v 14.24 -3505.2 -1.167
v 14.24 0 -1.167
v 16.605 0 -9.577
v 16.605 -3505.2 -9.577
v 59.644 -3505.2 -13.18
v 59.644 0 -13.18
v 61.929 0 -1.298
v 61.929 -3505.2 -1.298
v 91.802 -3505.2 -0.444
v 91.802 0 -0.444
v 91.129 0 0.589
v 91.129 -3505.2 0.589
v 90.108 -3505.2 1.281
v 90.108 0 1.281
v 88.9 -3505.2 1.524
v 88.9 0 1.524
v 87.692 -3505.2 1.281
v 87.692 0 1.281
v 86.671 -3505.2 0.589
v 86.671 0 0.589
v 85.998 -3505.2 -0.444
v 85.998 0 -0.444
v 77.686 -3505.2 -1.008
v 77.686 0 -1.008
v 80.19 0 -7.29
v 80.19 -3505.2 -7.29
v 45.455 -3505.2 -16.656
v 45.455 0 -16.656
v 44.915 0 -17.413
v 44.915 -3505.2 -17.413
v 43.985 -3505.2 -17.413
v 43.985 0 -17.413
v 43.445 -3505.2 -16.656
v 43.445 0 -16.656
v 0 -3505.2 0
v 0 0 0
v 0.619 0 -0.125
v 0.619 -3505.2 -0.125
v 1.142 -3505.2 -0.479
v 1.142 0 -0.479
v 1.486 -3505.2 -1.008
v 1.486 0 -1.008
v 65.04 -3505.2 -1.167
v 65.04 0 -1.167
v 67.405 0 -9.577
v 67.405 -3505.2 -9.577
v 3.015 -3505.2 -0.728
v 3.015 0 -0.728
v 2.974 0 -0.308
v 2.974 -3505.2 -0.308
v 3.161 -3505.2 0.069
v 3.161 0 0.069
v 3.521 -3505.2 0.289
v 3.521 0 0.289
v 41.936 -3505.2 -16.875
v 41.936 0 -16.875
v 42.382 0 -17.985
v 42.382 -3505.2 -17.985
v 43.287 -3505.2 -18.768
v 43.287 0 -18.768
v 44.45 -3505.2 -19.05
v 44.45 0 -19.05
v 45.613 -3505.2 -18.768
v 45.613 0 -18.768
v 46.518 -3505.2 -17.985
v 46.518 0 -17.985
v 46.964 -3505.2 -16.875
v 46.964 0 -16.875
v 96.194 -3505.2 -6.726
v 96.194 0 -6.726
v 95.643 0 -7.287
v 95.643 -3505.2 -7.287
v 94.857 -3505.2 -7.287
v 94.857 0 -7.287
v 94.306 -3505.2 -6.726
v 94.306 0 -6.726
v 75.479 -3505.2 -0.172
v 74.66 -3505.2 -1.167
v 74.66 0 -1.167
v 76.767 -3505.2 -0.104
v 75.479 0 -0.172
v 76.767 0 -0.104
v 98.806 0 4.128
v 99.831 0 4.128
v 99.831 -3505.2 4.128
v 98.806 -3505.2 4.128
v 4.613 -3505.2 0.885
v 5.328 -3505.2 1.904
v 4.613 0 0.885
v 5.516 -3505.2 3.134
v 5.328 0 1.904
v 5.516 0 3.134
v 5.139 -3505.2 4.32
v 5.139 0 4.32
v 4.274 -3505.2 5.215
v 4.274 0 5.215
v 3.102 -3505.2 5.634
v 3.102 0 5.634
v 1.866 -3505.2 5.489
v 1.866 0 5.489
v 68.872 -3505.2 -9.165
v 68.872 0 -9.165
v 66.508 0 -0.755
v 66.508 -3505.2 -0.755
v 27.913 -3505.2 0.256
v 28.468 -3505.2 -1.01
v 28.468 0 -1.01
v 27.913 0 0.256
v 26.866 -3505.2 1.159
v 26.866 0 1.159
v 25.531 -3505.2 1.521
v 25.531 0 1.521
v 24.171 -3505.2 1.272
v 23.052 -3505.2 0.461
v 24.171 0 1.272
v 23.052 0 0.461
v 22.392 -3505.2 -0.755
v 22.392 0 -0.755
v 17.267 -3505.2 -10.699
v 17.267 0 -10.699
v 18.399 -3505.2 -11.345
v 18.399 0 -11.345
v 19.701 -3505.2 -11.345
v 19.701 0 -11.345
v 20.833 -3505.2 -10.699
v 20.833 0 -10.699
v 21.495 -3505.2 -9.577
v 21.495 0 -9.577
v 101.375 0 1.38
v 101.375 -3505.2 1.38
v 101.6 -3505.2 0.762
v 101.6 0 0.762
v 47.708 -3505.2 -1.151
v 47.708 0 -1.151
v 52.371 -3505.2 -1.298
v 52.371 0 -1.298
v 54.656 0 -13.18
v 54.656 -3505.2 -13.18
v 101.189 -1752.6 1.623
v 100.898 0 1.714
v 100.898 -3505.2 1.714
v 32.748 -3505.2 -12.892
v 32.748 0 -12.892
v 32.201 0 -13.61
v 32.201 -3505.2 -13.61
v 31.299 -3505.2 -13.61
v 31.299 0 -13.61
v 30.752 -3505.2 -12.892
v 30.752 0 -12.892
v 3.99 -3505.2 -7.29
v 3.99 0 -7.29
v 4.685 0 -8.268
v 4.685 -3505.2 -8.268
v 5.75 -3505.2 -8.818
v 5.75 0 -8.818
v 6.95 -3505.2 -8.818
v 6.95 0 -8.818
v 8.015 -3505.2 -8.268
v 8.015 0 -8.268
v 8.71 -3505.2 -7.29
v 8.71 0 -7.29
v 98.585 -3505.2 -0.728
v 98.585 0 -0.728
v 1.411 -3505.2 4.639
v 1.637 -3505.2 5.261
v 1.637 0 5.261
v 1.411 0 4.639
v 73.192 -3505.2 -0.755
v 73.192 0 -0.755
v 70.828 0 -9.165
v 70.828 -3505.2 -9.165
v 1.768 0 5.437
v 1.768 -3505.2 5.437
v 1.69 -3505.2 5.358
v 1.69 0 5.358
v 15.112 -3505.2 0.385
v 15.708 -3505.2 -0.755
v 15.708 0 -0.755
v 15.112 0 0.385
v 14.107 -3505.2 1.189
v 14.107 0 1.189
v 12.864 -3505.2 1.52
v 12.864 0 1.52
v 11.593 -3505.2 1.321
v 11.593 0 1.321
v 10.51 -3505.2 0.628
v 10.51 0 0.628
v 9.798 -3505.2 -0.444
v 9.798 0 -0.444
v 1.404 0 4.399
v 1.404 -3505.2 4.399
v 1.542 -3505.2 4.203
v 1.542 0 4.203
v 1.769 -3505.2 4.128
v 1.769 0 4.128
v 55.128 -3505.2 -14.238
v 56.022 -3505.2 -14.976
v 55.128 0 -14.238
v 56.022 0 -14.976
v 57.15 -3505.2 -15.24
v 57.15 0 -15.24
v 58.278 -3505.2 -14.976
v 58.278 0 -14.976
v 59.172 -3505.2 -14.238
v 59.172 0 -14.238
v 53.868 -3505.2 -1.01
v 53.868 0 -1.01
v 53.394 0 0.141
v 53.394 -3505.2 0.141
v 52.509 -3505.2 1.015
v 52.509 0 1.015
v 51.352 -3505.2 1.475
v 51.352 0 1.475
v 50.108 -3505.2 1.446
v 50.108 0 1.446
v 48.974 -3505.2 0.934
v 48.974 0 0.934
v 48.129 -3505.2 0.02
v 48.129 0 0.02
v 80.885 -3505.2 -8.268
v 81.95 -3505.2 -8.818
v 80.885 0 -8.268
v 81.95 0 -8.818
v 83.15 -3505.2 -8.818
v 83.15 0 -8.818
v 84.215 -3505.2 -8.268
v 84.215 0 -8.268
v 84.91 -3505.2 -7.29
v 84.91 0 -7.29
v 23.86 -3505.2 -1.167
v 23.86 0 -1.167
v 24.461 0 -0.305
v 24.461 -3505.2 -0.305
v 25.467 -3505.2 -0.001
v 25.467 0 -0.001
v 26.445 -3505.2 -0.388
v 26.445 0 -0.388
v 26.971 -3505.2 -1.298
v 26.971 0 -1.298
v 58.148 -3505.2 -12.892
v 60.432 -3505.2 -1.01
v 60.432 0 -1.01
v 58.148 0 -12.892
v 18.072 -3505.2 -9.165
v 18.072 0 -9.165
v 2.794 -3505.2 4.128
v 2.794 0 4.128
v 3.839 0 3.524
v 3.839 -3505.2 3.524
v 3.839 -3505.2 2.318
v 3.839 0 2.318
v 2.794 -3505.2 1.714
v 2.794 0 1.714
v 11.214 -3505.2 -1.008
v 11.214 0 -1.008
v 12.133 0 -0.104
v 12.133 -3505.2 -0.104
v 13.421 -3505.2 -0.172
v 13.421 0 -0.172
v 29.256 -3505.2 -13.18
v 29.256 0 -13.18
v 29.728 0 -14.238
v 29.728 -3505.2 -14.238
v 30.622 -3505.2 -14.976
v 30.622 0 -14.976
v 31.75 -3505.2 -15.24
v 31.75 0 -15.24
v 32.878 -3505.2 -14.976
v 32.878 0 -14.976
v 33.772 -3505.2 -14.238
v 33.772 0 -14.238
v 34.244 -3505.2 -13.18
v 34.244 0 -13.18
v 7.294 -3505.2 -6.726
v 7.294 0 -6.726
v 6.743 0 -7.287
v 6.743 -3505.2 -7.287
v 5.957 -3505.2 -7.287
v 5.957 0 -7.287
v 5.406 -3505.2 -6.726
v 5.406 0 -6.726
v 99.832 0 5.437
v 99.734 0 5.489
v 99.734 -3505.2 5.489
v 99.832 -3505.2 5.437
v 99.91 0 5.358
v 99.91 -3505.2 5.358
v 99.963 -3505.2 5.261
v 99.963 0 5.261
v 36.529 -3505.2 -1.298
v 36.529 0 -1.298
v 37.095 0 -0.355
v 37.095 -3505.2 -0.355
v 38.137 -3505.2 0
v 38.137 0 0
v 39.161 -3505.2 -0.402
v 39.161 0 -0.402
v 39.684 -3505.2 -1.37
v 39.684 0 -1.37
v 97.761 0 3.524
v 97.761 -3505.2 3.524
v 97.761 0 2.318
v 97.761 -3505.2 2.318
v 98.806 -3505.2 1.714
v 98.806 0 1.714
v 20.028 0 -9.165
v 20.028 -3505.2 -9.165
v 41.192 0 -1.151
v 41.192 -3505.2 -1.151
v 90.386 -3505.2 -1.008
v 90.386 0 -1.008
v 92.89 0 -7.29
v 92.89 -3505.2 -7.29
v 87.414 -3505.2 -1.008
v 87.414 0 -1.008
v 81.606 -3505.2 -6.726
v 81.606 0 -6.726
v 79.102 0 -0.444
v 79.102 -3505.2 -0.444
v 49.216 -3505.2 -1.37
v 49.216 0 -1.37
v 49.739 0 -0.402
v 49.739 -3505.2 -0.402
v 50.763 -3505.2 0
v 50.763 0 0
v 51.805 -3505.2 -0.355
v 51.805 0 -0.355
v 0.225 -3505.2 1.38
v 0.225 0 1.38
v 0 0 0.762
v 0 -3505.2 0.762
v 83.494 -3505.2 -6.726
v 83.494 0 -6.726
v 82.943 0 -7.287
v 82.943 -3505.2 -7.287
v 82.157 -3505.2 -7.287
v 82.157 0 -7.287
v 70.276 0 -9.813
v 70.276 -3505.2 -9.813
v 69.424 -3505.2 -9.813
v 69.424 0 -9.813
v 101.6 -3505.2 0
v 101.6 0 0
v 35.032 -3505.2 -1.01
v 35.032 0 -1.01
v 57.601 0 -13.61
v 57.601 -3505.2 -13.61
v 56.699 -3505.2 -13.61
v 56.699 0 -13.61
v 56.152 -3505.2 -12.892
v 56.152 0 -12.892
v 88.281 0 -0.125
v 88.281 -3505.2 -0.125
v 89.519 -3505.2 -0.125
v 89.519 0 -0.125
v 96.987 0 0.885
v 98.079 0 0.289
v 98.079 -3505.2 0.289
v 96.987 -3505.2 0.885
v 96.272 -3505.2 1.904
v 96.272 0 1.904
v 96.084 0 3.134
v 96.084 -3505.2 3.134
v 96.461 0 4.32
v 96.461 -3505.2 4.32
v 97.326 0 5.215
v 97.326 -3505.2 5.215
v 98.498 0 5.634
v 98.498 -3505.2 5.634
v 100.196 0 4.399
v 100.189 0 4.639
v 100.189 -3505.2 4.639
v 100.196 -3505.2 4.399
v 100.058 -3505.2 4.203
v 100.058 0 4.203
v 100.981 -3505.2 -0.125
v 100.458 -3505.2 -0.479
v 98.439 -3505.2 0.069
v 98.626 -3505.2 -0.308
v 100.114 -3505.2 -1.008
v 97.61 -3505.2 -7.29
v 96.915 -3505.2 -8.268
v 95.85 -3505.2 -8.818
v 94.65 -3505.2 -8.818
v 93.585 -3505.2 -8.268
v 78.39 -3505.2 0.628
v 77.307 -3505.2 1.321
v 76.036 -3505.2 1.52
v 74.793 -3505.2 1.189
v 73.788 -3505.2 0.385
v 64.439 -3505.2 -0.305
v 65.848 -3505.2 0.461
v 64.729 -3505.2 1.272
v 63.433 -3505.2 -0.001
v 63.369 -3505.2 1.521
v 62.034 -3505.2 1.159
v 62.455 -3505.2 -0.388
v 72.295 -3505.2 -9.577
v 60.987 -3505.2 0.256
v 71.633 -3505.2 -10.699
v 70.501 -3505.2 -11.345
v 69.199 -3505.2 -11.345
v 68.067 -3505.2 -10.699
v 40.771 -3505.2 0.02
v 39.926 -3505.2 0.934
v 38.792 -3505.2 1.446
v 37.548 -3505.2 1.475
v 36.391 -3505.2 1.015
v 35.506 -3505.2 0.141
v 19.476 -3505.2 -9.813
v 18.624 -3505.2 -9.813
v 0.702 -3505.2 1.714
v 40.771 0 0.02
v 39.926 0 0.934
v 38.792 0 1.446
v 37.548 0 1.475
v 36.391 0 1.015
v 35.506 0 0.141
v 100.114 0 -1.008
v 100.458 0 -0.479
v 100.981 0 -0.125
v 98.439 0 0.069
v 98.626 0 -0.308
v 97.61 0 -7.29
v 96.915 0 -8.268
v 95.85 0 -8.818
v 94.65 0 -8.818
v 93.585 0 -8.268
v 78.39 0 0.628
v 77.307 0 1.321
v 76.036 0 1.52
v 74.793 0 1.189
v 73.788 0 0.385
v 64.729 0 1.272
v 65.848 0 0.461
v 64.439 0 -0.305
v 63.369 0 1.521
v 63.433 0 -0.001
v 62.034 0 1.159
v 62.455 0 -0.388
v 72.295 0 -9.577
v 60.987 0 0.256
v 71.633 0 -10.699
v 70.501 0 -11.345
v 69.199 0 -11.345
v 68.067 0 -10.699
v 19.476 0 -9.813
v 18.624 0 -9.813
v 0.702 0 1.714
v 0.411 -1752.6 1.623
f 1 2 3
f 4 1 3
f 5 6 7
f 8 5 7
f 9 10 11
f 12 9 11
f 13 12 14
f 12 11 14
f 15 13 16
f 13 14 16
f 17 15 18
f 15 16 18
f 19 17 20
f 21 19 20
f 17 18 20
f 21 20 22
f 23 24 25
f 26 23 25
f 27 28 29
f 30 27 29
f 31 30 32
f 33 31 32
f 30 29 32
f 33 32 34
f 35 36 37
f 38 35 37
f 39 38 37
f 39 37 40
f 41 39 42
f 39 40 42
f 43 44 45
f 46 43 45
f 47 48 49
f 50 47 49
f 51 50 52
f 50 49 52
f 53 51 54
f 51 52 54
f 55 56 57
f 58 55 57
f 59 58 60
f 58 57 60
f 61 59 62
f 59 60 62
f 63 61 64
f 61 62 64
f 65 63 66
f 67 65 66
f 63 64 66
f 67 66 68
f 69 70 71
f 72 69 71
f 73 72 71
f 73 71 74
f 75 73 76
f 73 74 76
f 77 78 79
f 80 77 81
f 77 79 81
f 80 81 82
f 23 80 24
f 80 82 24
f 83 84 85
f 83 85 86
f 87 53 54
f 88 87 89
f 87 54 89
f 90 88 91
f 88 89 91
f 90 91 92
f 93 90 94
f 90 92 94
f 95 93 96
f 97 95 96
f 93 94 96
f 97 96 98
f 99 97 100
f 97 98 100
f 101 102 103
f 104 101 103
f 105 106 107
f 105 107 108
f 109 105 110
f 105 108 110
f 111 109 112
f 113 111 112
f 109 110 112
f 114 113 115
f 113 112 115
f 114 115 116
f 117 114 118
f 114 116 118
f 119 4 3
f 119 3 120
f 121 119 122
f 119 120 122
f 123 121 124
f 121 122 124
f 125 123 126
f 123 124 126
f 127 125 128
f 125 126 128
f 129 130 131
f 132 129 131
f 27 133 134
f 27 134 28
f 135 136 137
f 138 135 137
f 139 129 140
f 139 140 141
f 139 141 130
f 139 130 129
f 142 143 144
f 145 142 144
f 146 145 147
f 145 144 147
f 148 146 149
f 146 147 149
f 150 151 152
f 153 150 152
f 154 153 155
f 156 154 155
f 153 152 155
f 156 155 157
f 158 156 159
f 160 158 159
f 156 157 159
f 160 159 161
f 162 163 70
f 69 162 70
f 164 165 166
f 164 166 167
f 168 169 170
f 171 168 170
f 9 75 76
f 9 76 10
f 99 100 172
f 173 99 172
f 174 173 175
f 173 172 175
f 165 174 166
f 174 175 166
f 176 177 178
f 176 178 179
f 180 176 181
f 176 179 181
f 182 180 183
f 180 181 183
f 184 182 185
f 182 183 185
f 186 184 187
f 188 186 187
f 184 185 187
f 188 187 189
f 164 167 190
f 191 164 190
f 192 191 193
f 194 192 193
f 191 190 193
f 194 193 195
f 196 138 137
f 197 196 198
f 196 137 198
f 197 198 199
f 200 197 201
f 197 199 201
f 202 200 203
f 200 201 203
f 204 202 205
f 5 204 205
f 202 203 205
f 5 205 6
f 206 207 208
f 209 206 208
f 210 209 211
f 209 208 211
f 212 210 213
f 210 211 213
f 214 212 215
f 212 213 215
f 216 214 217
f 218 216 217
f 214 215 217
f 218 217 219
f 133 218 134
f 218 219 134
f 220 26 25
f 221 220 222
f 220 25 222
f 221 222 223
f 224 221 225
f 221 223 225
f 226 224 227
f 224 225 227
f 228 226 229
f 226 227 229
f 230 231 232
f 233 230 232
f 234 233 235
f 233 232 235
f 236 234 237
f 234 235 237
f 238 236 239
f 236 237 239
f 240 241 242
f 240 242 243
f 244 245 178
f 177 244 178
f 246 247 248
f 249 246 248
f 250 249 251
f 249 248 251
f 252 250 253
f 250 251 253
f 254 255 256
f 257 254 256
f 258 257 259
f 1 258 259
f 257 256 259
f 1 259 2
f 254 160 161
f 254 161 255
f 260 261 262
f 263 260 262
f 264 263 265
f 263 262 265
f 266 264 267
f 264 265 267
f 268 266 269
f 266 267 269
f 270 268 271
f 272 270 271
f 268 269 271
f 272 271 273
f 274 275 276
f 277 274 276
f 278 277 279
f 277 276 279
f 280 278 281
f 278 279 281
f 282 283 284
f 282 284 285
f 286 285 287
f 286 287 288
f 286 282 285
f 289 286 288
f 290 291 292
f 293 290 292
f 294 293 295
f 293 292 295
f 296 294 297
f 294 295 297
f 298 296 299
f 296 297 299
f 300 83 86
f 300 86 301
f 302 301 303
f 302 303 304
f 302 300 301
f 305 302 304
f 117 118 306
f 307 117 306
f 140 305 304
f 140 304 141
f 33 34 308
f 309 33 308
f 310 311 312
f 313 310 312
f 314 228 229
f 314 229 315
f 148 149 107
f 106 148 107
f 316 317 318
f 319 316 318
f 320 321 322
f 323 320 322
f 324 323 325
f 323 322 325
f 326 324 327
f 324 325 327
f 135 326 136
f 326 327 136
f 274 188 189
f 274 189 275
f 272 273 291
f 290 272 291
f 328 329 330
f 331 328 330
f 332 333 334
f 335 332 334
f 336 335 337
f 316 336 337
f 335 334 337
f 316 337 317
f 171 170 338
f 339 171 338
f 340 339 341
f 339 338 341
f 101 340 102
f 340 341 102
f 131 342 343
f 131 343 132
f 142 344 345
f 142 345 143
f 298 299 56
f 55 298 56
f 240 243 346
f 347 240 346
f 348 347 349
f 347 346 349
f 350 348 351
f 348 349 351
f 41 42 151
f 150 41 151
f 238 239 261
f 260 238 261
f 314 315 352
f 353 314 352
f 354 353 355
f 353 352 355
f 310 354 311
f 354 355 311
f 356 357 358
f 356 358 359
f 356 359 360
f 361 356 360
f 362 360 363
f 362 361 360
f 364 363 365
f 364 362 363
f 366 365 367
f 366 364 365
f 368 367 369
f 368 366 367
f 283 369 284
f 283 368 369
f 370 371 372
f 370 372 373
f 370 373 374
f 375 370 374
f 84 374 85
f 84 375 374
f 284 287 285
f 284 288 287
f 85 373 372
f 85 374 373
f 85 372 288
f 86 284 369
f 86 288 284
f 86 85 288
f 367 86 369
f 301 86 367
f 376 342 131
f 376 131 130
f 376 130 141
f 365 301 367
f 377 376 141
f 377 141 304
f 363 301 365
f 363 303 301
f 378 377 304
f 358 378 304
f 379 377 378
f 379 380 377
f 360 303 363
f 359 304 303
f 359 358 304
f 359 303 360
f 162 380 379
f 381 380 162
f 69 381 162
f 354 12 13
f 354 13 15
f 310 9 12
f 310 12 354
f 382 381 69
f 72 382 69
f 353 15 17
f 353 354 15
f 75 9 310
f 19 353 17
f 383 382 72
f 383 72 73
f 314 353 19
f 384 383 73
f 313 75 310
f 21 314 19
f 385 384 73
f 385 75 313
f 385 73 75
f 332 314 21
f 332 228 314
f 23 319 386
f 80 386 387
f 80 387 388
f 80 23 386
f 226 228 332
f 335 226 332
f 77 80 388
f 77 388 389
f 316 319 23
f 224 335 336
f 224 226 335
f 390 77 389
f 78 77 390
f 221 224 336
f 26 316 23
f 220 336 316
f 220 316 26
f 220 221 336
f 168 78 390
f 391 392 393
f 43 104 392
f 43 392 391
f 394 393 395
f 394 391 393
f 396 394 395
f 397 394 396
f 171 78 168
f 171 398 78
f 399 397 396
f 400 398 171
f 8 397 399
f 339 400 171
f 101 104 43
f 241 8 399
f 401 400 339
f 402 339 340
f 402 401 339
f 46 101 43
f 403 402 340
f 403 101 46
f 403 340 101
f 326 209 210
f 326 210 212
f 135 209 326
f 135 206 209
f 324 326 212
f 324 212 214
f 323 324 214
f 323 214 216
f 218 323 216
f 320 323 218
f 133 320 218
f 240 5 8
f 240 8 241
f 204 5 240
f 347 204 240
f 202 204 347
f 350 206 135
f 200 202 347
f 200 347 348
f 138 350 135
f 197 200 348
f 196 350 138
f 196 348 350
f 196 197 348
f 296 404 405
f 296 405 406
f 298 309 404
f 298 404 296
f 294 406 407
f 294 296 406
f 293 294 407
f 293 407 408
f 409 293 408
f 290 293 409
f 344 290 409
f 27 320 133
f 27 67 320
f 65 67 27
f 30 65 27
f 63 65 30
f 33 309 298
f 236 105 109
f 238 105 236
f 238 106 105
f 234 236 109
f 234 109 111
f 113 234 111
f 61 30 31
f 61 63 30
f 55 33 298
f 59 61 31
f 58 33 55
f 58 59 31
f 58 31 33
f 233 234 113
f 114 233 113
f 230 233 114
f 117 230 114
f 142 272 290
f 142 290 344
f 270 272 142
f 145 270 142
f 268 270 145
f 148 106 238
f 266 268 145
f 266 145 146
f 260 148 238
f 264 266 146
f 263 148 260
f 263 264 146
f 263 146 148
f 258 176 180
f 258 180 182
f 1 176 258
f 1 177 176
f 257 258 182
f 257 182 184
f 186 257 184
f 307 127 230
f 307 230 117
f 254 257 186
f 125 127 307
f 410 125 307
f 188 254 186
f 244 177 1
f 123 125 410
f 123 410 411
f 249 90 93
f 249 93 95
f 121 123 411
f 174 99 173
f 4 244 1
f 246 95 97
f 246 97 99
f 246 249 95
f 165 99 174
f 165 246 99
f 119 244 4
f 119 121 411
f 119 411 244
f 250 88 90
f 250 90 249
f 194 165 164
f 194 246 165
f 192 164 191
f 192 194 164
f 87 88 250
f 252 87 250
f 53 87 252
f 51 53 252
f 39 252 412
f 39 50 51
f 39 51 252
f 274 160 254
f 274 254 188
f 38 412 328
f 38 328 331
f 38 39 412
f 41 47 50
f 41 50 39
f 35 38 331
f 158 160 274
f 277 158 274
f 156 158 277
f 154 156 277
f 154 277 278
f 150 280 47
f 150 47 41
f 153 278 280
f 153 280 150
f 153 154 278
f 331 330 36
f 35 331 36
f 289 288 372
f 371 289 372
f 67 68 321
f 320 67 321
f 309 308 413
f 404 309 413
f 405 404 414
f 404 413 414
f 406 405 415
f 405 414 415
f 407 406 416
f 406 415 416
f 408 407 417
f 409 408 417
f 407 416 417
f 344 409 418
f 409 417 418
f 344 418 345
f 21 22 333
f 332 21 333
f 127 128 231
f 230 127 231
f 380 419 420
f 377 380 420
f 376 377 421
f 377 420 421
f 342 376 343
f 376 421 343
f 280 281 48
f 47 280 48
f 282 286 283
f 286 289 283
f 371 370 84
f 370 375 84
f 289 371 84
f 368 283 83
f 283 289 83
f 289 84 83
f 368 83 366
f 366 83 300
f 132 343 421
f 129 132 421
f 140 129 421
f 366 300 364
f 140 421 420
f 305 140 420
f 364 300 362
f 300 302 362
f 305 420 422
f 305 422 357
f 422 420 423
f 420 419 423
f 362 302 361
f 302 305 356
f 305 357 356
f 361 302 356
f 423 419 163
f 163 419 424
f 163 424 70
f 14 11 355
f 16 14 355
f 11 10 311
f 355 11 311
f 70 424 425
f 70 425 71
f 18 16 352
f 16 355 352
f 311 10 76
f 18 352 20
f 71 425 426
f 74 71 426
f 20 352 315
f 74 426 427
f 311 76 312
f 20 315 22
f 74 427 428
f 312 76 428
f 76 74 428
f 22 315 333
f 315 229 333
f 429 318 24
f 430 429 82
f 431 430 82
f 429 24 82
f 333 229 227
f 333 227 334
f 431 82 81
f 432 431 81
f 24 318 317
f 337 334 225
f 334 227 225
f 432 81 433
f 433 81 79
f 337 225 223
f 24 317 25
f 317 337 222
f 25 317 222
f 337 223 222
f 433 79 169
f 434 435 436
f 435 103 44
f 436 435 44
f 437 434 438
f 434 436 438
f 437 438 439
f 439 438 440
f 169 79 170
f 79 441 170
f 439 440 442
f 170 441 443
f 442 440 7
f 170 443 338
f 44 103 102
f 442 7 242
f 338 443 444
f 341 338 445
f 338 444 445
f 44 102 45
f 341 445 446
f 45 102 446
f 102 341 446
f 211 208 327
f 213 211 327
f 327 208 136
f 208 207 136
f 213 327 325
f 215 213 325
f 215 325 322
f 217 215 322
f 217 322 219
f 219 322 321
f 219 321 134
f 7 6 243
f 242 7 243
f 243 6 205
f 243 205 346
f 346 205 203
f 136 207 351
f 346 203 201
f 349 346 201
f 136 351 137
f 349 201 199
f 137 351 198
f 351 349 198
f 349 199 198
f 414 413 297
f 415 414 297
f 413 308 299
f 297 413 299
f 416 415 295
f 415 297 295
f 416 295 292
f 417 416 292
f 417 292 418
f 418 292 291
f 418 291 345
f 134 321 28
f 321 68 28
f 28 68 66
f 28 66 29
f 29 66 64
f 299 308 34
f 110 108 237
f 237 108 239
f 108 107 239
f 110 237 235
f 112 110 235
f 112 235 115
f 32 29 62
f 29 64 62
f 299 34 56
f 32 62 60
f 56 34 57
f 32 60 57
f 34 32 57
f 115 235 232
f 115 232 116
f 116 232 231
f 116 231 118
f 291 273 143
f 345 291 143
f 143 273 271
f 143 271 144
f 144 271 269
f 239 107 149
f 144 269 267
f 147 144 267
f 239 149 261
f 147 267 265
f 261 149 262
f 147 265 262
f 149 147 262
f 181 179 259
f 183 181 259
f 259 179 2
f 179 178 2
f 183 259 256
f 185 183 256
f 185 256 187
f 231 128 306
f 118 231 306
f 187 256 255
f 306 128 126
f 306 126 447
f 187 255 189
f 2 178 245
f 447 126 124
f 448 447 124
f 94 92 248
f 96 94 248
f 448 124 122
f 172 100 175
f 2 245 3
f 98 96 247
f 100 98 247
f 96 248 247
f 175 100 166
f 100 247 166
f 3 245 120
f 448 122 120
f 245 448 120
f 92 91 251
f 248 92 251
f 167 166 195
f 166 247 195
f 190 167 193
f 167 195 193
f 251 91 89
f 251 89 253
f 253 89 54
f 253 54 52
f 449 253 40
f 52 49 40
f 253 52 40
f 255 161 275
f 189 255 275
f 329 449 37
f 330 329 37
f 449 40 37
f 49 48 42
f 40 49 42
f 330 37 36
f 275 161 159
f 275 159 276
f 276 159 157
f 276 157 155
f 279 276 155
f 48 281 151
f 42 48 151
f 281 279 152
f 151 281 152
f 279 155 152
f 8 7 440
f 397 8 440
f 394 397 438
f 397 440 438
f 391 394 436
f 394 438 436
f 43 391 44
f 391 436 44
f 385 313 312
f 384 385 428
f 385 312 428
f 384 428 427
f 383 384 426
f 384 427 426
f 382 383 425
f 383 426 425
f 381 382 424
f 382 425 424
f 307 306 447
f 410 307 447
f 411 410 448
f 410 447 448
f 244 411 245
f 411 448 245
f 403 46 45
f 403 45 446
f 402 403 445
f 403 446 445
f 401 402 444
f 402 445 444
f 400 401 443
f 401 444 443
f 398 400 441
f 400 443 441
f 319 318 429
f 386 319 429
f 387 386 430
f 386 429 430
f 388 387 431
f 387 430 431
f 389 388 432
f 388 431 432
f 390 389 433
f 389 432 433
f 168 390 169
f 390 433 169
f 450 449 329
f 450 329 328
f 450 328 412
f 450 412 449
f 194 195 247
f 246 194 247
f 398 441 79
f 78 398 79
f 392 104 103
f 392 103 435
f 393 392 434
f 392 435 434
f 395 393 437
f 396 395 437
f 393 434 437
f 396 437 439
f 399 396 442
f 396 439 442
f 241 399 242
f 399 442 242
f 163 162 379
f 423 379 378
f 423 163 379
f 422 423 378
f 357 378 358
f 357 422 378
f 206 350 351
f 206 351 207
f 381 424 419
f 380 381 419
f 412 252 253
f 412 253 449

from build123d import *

# Parameters (mm, degrees)
BOSS_EXTRUDE1_DEPTH = 3505.2
CUT_EXTRUDE1_DEPTH  = 3506.2
BOSS_EXTRUDE2_DEPTH = 3505.2
FILLET1_R           = 0.508


with BuildPart() as part:
    # Sketch1 → Boss-Extrude1 (new body)
    with BuildSketch(Plane(origin=(0, 0, 0), x_dir=(1, 0, 0), z_dir=(0, 1, 0))):
        with BuildLine():
            Line((1.486485486, 1.007746677), (3.990499229, 7.290402101))
            ThreePointArc((3.990499229, 7.290402101), (6.35, 8.89), (8.709500771, 7.290402101))
            Line((8.709500771, 7.290402101), (11.213514514, 1.007746677))
            ThreePointArc((11.213514514, 1.007746677), (12.784145017, 0.002213875), (14.240485976, 1.167137652))
            Line((14.240485976, 1.167137652), (16.604784165, 9.577400553))
            ThreePointArc((16.604784165, 9.577400553), (19.05, 11.43), (21.495215835, 9.577400553))
            Line((21.495215835, 9.577400553), (23.859514024, 1.167137652))
            ThreePointArc((23.859514024, 1.167137652), (25.467277455, 0.001414904), (26.971422384, 1.298087881))
            Line((26.971422384, 1.298087881), (29.255678756, 13.179543046))
            ThreePointArc((29.255678756, 13.179543046), (31.75, 15.24), (34.244321244, 13.179543046))
            Line((34.244321244, 13.179543046), (36.528577616, 1.298087881))
            ThreePointArc((36.528577616, 1.298087881), (38.136521885, 0.00041683), (39.683572077, 1.370114107))
            Line((39.683572077, 1.370114107), (41.936393529, 16.875215703))
            ThreePointArc((41.936393529, 16.875215703), (44.45, 19.05), (46.963606471, 16.875215703))
            Line((46.963606471, 16.875215703), (49.216427923, 1.370114107))
            ThreePointArc((49.216427923, 1.370114107), (50.763478115, 0.00041683), (52.371422384, 1.298087881))
            Line((52.371422384, 1.298087881), (54.655678756, 13.179543046))
            ThreePointArc((54.655678756, 13.179543046), (57.15, 15.24), (59.644321244, 13.179543046))
            Line((59.644321244, 13.179543046), (61.928577616, 1.298087881))
            ThreePointArc((61.928577616, 1.298087881), (63.432722545, 0.001414904), (65.040485976, 1.167137652))
            Line((65.040485976, 1.167137652), (67.404784165, 9.577400553))
            ThreePointArc((67.404784165, 9.577400553), (69.85, 11.43), (72.295215835, 9.577400553))
            Line((72.295215835, 9.577400553), (74.659514024, 1.167137652))
            ThreePointArc((74.659514024, 1.167137652), (76.115854983, 0.002213875), (77.686485486, 1.007746677))
            Line((77.686485486, 1.007746677), (80.190499229, 7.290402101))
            ThreePointArc((80.190499229, 7.290402101), (82.55, 8.89), (84.909500771, 7.290402101))
            Line((84.909500771, 7.290402101), (87.413514514, 1.007746677))
            ThreePointArc((87.413514514, 1.007746677), (88.9, 0), (90.386485486, 1.007746677))
            Line((90.386485486, 1.007746677), (92.890499229, 7.290402101))
            ThreePointArc((92.890499229, 7.290402101), (95.25, 8.89), (97.609500771, 7.290402101))
            Line((97.609500771, 7.290402101), (100.113514514, 1.007746677))
            ThreePointArc((100.113514514, 1.007746677), (100.702058957, 0.275684268), (101.6, 0))
            Line((101.6, 0), (101.6, -1.524))
            ThreePointArc((101.6, -1.524), (99.846877012, -0.985759286), (98.697814051, 0.443505416))
            Line((98.697814051, 0.443505416), (96.193800308, 6.72616084))
            ThreePointArc((96.193800308, 6.72616084), (95.25, 7.366), (94.306199692, 6.72616084))
            Line((94.306199692, 6.72616084), (91.802185949, 0.443505416))
            ThreePointArc((91.802185949, 0.443505416), (88.9, -1.524), (85.997814051, 0.443505416))
            Line((85.997814051, 0.443505416), (83.493800308, 6.72616084))
            ThreePointArc((83.493800308, 6.72616084), (82.55, 7.366), (81.606199692, 6.72616084))
            Line((81.606199692, 6.72616084), (79.102185949, 0.443505416))
            ThreePointArc((79.102185949, 0.443505416), (76.035716871, -1.519677673), (73.192384523, 0.75469732))
            Line((73.192384523, 0.75469732), (70.828086334, 9.164960221))
            ThreePointArc((70.828086334, 9.164960221), (69.85, 9.906), (68.871913666, 9.164960221))
            Line((68.871913666, 9.164960221), (66.507615477, 0.75469732))
            ThreePointArc((66.507615477, 0.75469732), (63.368648778, -1.521237569), (60.43198487, 1.010362054))
            Line((60.43198487, 1.010362054), (58.147728498, 12.891817218))
            ThreePointArc((58.147728498, 12.891817218), (57.15, 13.716), (56.152271502, 12.891817218))
            Line((56.152271502, 12.891817218), (53.86801513, 1.010362054))
            ThreePointArc((53.86801513, 1.010362054), (50.728695368, -1.52318619), (47.708264041, 1.150984685))
            Line((47.708264041, 1.150984685), (45.455442588, 16.656086281))
            ThreePointArc((45.455442588, 16.656086281), (44.45, 17.526), (43.444557412, 16.656086281))
            Line((43.444557412, 16.656086281), (41.191735959, 1.150984685))
            ThreePointArc((41.191735959, 1.150984685), (38.171304632, -1.52318619), (35.03198487, 1.010362054))
            Line((35.03198487, 1.010362054), (32.747728498, 12.891817218))
            ThreePointArc((32.747728498, 12.891817218), (31.75, 13.716), (30.752271502, 12.891817218))
            Line((30.752271502, 12.891817218), (28.46801513, 1.010362054))
            ThreePointArc((28.46801513, 1.010362054), (25.531351222, -1.521237569), (22.392384523, 0.75469732))
            Line((22.392384523, 0.75469732), (20.028086334, 9.164960221))
            ThreePointArc((20.028086334, 9.164960221), (19.05, 9.906), (18.071913666, 9.164960221))
            Line((18.071913666, 9.164960221), (15.707615477, 0.75469732))
            ThreePointArc((15.707615477, 0.75469732), (12.864283129, -1.519677673), (9.797814051, 0.443505416))
            Line((9.797814051, 0.443505416), (7.293800308, 6.72616084))
            ThreePointArc((7.293800308, 6.72616084), (6.35, 7.366), (5.406199692, 6.72616084))
            Line((5.406199692, 6.72616084), (2.902185949, 0.443505416))
            ThreePointArc((2.902185949, 0.443505416), (1.753122988, -0.985759286), (0, -1.524))
            Line((0, -1.524), (0, 0))
            ThreePointArc((0, 0), (0.897941043, 0.275684268), (1.486485486, 1.007746677))
        make_face()
    extrude(amount=-BOSS_EXTRUDE1_DEPTH)

    # Sketch3 → Cut-Extrude1 (cut, through all)
    with BuildSketch(Plane(origin=(0, 0, 0), x_dir=(1, 0, 0), z_dir=(0, 1, 0))):
        Polygon((0, -0.762), (0, -1.524), (0.277345319, -1.524), align=None)
        Polygon((101.6, -0.762), (101.6, -1.524), (101.322654681, -1.524), align=None)
    extrude(amount=-CUT_EXTRUDE1_DEPTH, mode=Mode.SUBTRACT)

    # Sketch4 → Boss-Extrude2 (add, through all)
    with BuildSketch(Plane(origin=(0, 0, 0), x_dir=(1, 0, 0), z_dir=(0, 1, 0))):
        with BuildLine():
            Line((2.902185949, 0.443505416), (3.015459403, 0.727712357))
            ThreePointArc((3.015459403, 0.727712357), (3.040890247, 0.106552231), (3.520551169, -0.288937377))
            ThreePointArc((3.520551169, -0.288937377), (5.395968613, -3.748882593), (1.866026726, -5.488975049))
            ThreePointArc((1.866026726, -5.488975049), (1.726414147, -5.400370737), (1.63748848, -5.260962624))
            Line((1.63748848, -5.260962624), (1.411043325, -4.638809675))
            ThreePointArc((1.411043325, -4.638809675), (1.456969285, -4.289967378), (1.769066214, -4.1275))
            Line((1.769066214, -4.1275), (2.794, -4.1275))
            ThreePointArc((2.794, -4.1275), (4.0005, -2.921), (2.794, -1.7145))
            Line((2.794, -1.7145), (0.346681648, -1.7145))
            Line((0.346681648, -1.7145), (0.272995808, -1.512049818))
            ThreePointArc((0.272995808, -1.512049818), (1.864535831, -0.90661706), (2.902185949, 0.443505416))
        make_face()
        with BuildLine():
            Line((101.253318352, -1.7145), (101.327004192, -1.512049818))
            ThreePointArc((101.327004192, -1.512049818), (99.735464169, -0.90661706), (98.697814051, 0.443505416))
            Line((98.697814051, 0.443505416), (98.584540597, 0.727712357))
            ThreePointArc((98.584540597, 0.727712357), (98.559109753, 0.106552231), (98.079448831, -0.288937377))
            ThreePointArc((98.079448831, -0.288937377), (96.204031387, -3.748882593), (99.733973274, -5.488975049))
            ThreePointArc((99.733973274, -5.488975049), (99.873585853, -5.400370737), (99.96251152, -5.260962624))
            Line((99.96251152, -5.260962624), (100.188956675, -4.638809675))
            ThreePointArc((100.188956675, -4.638809675), (100.143030715, -4.289967378), (99.830933786, -4.1275))
            Line((99.830933786, -4.1275), (98.806, -4.1275))
            ThreePointArc((98.806, -4.1275), (97.5995, -2.921), (98.806, -1.7145))
            Line((98.806, -1.7145), (101.253318352, -1.7145))
        make_face()
    extrude(amount=-BOSS_EXTRUDE2_DEPTH)

    # Fillet1
    fillet1_edges = [part.edges().sort_by_distance(p)[0] for p in [
        (0.346681648, -1752.6, 1.7145),
        (101.253318352, -1752.6, 1.7145),
    ]]
    fillet(fillet1_edges, radius=FILLET1_R)


solid = part.part
